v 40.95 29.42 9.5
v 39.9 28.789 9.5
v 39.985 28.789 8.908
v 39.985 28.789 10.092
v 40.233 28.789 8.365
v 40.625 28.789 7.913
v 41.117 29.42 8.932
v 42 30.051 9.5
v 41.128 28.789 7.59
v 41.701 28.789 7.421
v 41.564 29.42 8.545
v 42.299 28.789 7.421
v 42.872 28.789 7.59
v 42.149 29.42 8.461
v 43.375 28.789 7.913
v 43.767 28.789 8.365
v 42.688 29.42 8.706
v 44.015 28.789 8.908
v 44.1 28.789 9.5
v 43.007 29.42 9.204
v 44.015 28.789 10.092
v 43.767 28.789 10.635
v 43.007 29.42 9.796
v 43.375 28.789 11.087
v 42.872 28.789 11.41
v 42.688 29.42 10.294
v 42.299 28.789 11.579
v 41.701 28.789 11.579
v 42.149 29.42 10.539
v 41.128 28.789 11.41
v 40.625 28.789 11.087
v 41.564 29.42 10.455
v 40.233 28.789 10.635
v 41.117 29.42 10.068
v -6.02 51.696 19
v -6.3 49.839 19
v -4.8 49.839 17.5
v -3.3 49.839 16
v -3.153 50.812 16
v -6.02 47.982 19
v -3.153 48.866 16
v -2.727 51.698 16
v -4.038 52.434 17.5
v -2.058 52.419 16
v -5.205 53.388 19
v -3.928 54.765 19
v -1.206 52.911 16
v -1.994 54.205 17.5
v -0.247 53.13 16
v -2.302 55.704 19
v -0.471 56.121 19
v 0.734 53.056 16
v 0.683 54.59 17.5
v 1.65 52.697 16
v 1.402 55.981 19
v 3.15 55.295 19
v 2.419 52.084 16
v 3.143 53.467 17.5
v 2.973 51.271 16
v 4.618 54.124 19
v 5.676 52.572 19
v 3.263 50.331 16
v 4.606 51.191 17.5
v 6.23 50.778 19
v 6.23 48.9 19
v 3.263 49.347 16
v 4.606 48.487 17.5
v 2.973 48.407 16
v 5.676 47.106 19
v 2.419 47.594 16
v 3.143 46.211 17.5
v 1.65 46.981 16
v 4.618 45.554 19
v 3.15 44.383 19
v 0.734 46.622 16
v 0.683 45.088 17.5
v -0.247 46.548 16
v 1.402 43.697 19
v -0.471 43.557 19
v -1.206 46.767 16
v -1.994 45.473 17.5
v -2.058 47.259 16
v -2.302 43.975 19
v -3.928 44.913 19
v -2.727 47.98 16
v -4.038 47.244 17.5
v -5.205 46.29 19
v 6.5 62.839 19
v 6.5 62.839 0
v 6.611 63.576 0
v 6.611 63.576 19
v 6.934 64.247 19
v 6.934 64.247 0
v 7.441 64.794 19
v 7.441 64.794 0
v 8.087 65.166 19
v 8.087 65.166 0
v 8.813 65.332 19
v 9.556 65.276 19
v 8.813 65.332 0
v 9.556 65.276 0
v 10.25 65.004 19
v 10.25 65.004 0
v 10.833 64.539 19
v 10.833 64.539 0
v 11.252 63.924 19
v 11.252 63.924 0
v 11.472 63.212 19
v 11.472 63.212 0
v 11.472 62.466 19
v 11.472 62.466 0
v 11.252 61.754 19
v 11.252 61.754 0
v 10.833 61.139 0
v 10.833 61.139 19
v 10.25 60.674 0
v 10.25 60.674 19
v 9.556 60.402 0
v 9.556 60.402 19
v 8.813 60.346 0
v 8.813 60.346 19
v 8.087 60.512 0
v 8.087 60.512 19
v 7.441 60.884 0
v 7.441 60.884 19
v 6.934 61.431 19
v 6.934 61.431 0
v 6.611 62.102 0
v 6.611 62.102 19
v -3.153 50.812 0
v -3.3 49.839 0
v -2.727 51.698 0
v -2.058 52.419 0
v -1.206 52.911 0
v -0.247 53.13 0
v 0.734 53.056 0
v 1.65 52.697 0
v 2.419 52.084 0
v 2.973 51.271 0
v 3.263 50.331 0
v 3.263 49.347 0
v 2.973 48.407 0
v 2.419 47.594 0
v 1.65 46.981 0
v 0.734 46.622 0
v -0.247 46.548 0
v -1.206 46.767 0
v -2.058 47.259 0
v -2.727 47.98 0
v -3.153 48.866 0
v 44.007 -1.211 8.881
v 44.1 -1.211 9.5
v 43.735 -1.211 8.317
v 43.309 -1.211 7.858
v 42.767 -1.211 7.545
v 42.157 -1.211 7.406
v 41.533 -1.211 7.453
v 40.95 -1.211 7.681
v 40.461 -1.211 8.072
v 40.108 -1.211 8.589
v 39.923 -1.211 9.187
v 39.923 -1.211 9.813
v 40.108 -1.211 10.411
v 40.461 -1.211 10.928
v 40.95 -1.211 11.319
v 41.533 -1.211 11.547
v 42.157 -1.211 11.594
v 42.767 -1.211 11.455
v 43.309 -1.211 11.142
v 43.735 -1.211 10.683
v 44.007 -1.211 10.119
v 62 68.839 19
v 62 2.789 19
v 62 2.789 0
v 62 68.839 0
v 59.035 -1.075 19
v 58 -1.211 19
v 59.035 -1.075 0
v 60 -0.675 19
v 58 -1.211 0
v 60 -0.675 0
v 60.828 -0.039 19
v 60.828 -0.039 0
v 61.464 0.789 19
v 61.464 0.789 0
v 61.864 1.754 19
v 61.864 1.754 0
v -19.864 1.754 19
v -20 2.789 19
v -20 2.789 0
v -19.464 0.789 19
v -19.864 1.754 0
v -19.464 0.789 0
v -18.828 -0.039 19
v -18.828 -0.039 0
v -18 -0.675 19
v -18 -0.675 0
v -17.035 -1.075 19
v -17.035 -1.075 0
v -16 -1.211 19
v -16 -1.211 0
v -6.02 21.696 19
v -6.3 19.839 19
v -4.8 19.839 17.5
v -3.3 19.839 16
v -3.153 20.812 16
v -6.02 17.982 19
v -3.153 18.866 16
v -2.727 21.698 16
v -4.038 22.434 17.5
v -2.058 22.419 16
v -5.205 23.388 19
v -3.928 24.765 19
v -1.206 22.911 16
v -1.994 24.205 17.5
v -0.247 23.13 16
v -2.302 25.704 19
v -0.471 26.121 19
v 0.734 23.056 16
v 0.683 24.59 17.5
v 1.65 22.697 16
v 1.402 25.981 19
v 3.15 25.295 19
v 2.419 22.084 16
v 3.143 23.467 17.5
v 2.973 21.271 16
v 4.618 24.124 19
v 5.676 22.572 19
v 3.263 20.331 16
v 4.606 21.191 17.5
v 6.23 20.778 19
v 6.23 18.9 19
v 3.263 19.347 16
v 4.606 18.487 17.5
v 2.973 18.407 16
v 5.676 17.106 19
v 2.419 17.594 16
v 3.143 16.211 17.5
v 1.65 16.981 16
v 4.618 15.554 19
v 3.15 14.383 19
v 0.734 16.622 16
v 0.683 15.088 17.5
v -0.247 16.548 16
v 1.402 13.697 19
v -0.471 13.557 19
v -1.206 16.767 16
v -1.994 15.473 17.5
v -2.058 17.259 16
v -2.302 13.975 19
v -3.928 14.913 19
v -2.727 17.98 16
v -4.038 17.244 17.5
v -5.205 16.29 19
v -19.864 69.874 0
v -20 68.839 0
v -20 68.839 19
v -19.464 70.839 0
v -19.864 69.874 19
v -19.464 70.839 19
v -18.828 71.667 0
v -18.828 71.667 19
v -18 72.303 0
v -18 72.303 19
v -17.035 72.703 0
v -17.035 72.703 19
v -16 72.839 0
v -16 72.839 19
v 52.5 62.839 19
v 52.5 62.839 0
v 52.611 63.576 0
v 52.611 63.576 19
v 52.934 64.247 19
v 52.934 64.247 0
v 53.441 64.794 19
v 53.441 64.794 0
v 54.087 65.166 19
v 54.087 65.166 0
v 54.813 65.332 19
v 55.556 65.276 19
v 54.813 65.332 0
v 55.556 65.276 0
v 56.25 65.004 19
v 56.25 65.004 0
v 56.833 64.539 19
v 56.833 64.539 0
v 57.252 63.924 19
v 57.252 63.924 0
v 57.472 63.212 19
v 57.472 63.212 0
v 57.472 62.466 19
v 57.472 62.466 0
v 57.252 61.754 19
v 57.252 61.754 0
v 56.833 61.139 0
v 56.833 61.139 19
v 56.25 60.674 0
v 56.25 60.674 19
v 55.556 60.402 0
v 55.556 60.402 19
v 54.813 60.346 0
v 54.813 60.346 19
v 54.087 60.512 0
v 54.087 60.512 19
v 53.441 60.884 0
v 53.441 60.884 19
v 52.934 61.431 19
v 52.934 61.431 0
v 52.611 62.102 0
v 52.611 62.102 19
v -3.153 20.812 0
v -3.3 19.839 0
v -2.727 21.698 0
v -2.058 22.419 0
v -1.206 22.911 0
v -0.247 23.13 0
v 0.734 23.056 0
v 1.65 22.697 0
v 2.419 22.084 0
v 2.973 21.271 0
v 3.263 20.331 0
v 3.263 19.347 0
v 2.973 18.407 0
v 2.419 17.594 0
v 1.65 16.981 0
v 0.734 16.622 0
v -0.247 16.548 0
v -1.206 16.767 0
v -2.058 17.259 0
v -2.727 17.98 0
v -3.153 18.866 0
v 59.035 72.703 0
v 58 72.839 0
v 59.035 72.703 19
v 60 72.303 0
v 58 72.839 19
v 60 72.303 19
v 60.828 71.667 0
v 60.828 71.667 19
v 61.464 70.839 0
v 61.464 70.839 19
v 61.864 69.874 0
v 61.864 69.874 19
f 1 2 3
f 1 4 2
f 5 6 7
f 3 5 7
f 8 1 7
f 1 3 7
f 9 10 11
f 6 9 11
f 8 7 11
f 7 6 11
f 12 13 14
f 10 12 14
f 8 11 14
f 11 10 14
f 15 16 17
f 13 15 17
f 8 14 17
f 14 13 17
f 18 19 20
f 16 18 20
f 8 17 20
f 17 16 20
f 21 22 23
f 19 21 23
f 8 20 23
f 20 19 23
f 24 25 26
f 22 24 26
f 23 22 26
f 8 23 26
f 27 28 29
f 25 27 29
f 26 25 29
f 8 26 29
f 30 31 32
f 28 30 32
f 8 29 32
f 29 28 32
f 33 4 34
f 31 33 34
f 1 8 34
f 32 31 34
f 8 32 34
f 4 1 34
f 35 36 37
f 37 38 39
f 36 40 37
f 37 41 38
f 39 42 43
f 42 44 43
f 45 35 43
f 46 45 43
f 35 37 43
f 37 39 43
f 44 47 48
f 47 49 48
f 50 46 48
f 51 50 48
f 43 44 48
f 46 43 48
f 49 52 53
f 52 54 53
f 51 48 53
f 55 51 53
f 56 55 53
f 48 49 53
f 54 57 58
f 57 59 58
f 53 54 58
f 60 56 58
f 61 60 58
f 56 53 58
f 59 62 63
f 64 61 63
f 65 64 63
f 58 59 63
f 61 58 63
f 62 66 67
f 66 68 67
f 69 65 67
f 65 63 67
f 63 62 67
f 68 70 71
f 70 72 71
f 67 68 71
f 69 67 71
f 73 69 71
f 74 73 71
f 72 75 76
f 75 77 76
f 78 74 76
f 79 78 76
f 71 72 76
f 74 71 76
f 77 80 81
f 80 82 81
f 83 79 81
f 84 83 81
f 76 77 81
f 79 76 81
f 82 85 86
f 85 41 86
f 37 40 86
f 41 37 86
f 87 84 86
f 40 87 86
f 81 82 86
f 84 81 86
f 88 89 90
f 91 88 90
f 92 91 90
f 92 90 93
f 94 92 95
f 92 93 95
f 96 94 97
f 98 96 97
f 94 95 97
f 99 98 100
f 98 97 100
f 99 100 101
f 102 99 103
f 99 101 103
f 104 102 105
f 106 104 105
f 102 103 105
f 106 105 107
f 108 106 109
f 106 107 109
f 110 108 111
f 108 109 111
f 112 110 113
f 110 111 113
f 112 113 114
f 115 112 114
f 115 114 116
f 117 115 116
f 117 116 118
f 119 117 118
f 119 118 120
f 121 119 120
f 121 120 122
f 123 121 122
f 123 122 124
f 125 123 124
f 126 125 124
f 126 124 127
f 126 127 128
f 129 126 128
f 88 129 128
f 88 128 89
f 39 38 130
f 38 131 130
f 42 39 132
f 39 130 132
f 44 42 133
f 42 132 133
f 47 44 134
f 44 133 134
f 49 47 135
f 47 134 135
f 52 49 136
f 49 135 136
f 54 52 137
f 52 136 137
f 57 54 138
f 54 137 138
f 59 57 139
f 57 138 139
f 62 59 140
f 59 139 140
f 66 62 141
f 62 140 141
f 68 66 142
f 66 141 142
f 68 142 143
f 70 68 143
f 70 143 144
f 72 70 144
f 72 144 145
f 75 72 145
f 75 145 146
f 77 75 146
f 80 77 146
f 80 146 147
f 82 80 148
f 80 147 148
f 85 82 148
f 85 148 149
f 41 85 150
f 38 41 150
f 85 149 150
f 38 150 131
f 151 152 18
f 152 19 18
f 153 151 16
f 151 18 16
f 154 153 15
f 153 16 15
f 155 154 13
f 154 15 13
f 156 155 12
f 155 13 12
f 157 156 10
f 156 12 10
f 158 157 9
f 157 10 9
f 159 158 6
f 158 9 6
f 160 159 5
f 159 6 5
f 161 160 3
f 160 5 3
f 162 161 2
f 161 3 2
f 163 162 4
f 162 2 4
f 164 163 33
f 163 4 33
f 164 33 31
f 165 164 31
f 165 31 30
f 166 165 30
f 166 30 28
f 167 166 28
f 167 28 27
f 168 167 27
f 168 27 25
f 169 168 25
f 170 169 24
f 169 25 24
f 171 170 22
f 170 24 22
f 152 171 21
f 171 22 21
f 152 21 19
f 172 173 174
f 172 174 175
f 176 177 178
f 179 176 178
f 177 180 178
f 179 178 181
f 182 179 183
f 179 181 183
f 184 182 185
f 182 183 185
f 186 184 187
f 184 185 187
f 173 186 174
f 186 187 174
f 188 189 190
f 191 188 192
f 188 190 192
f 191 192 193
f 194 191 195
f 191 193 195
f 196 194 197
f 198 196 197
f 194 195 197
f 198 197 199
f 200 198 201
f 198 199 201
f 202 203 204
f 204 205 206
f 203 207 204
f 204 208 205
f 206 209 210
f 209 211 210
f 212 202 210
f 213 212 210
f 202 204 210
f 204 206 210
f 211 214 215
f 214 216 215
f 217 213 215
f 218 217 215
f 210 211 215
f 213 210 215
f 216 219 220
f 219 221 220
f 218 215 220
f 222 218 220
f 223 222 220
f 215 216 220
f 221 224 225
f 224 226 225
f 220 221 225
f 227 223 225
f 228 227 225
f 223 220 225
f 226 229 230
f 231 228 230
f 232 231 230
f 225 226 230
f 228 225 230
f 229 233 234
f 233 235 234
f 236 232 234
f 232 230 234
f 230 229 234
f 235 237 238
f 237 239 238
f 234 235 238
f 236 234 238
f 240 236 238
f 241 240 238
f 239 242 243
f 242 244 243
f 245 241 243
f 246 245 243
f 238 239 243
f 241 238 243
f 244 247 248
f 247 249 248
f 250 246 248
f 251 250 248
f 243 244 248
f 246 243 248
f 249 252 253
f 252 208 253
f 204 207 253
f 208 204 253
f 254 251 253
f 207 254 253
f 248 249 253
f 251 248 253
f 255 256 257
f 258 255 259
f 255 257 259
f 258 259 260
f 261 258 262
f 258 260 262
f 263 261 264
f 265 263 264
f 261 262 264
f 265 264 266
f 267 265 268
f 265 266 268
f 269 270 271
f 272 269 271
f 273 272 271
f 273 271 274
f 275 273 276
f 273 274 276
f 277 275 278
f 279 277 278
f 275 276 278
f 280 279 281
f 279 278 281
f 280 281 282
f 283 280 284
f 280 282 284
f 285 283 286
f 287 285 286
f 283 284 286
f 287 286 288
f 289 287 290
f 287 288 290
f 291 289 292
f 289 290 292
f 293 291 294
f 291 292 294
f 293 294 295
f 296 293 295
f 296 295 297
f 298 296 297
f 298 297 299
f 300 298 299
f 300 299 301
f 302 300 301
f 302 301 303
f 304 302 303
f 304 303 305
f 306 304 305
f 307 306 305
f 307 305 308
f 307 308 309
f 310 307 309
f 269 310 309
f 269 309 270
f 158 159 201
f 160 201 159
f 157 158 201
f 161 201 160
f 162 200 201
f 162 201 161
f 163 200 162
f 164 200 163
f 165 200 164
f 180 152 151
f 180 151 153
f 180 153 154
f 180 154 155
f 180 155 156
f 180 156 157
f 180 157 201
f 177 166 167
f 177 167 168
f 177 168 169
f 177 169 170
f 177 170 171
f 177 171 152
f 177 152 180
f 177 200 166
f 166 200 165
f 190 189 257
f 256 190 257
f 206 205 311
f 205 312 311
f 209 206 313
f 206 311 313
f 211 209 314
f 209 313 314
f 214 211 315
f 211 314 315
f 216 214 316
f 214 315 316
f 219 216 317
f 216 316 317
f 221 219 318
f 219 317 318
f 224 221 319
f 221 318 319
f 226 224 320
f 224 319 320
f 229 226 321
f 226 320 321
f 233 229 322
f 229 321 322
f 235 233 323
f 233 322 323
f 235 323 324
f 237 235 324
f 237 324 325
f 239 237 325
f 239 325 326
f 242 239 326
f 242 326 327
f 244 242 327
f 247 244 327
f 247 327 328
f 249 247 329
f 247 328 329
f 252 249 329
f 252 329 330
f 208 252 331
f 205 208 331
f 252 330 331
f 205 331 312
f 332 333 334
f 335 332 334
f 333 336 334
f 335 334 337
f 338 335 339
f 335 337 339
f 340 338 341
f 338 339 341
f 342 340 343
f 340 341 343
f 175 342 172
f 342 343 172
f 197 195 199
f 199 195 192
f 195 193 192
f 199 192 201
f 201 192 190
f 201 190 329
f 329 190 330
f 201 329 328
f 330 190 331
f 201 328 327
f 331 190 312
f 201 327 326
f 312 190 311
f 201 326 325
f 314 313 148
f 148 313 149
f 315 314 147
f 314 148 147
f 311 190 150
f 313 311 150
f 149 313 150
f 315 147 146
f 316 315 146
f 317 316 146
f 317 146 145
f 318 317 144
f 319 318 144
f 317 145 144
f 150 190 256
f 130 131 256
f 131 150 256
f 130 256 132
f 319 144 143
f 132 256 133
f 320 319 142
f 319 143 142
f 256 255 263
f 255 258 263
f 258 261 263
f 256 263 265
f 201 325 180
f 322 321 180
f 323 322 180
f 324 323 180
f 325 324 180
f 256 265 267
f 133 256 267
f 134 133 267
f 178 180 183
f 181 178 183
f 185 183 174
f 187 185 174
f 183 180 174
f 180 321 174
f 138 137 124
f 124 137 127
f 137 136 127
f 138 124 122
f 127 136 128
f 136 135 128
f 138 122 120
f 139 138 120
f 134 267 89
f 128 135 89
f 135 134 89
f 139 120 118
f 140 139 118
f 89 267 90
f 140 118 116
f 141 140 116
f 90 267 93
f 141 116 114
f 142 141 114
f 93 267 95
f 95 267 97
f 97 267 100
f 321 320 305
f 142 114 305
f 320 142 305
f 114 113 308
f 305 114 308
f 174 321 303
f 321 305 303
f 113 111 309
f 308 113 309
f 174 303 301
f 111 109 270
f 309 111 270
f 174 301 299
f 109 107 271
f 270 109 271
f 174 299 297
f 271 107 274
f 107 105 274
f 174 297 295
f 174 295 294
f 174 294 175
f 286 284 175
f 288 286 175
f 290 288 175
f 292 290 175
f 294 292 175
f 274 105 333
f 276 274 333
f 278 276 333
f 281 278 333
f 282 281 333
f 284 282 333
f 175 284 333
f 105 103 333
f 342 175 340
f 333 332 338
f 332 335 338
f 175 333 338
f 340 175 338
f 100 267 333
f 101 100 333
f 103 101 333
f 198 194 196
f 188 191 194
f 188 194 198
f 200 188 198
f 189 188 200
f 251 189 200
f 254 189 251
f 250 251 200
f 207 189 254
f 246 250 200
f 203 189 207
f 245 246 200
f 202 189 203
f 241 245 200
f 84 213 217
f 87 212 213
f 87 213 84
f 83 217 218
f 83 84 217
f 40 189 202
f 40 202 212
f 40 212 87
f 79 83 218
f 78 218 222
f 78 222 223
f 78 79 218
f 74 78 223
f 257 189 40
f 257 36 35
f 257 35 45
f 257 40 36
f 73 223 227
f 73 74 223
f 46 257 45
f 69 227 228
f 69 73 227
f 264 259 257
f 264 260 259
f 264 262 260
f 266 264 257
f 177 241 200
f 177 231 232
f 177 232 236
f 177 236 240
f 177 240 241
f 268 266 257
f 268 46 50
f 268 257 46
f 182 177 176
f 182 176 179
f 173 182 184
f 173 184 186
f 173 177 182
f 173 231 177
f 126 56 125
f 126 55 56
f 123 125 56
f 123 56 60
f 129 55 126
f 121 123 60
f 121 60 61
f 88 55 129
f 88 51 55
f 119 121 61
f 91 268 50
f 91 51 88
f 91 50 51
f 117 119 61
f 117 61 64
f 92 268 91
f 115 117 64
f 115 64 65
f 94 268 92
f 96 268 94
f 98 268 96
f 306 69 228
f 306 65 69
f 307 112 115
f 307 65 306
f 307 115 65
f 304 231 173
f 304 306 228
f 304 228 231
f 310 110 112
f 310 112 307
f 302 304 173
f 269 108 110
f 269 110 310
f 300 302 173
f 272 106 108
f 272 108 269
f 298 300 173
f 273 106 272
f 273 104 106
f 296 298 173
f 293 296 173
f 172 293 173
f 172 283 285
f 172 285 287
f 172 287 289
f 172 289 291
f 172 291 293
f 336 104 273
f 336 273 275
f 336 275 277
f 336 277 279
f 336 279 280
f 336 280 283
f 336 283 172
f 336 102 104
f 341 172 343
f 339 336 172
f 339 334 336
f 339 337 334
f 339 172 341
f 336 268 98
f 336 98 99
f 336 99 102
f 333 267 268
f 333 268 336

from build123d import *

# Parameters (mm, degrees)
SKETCH1_W                                           = 81.999999998
SKETCH1_H                                           = 60
BOSS_EXTRUDE1_DEPTH                                 = 19
TAP_DRILL_FOR_M6_TAP1_D                             = 5
CSK_FOR_M6_COUNTERSUNK_FLAT_HEAD_SCREW1_D           = 6.6
CSK_FOR_M6_COUNTERSUNK_FLAT_HEAD_SCREW1_CSINK_D     = 12.6
CSK_FOR_M6_COUNTERSUNK_FLAT_HEAD_SCREW1_CSINK_ANGLE = 90
SKETCH7_W                                           = 81.999999998
SKETCH7_H                                           = 14.054377775
BOSS_EXTRUDE2_DEPTH                                 = 19
TAP_DRILL_FOR_M5_TAP1_D                             = 4.2
TAP_DRILL_FOR_M5_TAP1_DEPTH                         = 30
TAP_DRILL_FOR_M5_TAP1_TIP                           = 1.2618073
FILLET1_R                                           = 4


with BuildPart() as part:
    # Sketch1 → Boss-Extrude1 (new body)
    with BuildSketch(Plane.XY):
        with Locations((20.999999999, 42.839007865)):
            Rectangle(SKETCH1_W, SKETCH1_H)
    extrude(amount=BOSS_EXTRUDE1_DEPTH)

    # Tap Drill for M6 Tap1 (through all)
    with Locations(Plane.XY.offset(19)):
        with Locations((8.999999998, 62.839007865), (54.999999998, 62.839007865)):
            Hole(TAP_DRILL_FOR_M6_TAP1_D / 2)

    # CSK for M6 Countersunk Flat Head Screw1 (through all)
    with Locations(Plane.XY.offset(19)):
        with Locations((0, 19.839007865), (0, 49.839007865)):
            CounterSinkHole(CSK_FOR_M6_COUNTERSUNK_FLAT_HEAD_SCREW1_D / 2, CSK_FOR_M6_COUNTERSUNK_FLAT_HEAD_SCREW1_CSINK_D / 2, counter_sink_angle=CSK_FOR_M6_COUNTERSUNK_FLAT_HEAD_SCREW1_CSINK_ANGLE)

    # Sketch7 → Boss-Extrude2 (add)
    with BuildSketch(Plane.XY.offset(19)):
        with Locations((20.999999999, 5.816196753)):
            Rectangle(SKETCH7_W, SKETCH7_H)
    extrude(amount=-BOSS_EXTRUDE2_DEPTH)

    # Tap Drill for M5 Tap1
    with Locations(Plane(origin=(0, -1.210992135, 0), x_dir=(-1, 0, 0), z_dir=(0, -1, 0))):
        with Locations((-41.999999998, -9.5)):
            Hole(TAP_DRILL_FOR_M5_TAP1_D / 2, depth=TAP_DRILL_FOR_M5_TAP1_DEPTH)
            with Locations((0, 0, -(TAP_DRILL_FOR_M5_TAP1_DEPTH + TAP_DRILL_FOR_M5_TAP1_TIP / 2))):  # 118° drill point
                Cone(0, TAP_DRILL_FOR_M5_TAP1_D / 2, TAP_DRILL_FOR_M5_TAP1_TIP, mode=Mode.SUBTRACT)

    # Fillet1
    fillet1_edges = [part.edges().sort_by_distance(p)[0] for p in [
        (-20, -1.210992135, 9.5),
        (61.999999998, -1.210992135, 9.5),
        (-20, 72.839007865, 9.5),
        (61.999999998, 72.839007865, 9.5),
    ]]
    fillet(fillet1_edges, radius=FILLET1_R)


solid = part.part
